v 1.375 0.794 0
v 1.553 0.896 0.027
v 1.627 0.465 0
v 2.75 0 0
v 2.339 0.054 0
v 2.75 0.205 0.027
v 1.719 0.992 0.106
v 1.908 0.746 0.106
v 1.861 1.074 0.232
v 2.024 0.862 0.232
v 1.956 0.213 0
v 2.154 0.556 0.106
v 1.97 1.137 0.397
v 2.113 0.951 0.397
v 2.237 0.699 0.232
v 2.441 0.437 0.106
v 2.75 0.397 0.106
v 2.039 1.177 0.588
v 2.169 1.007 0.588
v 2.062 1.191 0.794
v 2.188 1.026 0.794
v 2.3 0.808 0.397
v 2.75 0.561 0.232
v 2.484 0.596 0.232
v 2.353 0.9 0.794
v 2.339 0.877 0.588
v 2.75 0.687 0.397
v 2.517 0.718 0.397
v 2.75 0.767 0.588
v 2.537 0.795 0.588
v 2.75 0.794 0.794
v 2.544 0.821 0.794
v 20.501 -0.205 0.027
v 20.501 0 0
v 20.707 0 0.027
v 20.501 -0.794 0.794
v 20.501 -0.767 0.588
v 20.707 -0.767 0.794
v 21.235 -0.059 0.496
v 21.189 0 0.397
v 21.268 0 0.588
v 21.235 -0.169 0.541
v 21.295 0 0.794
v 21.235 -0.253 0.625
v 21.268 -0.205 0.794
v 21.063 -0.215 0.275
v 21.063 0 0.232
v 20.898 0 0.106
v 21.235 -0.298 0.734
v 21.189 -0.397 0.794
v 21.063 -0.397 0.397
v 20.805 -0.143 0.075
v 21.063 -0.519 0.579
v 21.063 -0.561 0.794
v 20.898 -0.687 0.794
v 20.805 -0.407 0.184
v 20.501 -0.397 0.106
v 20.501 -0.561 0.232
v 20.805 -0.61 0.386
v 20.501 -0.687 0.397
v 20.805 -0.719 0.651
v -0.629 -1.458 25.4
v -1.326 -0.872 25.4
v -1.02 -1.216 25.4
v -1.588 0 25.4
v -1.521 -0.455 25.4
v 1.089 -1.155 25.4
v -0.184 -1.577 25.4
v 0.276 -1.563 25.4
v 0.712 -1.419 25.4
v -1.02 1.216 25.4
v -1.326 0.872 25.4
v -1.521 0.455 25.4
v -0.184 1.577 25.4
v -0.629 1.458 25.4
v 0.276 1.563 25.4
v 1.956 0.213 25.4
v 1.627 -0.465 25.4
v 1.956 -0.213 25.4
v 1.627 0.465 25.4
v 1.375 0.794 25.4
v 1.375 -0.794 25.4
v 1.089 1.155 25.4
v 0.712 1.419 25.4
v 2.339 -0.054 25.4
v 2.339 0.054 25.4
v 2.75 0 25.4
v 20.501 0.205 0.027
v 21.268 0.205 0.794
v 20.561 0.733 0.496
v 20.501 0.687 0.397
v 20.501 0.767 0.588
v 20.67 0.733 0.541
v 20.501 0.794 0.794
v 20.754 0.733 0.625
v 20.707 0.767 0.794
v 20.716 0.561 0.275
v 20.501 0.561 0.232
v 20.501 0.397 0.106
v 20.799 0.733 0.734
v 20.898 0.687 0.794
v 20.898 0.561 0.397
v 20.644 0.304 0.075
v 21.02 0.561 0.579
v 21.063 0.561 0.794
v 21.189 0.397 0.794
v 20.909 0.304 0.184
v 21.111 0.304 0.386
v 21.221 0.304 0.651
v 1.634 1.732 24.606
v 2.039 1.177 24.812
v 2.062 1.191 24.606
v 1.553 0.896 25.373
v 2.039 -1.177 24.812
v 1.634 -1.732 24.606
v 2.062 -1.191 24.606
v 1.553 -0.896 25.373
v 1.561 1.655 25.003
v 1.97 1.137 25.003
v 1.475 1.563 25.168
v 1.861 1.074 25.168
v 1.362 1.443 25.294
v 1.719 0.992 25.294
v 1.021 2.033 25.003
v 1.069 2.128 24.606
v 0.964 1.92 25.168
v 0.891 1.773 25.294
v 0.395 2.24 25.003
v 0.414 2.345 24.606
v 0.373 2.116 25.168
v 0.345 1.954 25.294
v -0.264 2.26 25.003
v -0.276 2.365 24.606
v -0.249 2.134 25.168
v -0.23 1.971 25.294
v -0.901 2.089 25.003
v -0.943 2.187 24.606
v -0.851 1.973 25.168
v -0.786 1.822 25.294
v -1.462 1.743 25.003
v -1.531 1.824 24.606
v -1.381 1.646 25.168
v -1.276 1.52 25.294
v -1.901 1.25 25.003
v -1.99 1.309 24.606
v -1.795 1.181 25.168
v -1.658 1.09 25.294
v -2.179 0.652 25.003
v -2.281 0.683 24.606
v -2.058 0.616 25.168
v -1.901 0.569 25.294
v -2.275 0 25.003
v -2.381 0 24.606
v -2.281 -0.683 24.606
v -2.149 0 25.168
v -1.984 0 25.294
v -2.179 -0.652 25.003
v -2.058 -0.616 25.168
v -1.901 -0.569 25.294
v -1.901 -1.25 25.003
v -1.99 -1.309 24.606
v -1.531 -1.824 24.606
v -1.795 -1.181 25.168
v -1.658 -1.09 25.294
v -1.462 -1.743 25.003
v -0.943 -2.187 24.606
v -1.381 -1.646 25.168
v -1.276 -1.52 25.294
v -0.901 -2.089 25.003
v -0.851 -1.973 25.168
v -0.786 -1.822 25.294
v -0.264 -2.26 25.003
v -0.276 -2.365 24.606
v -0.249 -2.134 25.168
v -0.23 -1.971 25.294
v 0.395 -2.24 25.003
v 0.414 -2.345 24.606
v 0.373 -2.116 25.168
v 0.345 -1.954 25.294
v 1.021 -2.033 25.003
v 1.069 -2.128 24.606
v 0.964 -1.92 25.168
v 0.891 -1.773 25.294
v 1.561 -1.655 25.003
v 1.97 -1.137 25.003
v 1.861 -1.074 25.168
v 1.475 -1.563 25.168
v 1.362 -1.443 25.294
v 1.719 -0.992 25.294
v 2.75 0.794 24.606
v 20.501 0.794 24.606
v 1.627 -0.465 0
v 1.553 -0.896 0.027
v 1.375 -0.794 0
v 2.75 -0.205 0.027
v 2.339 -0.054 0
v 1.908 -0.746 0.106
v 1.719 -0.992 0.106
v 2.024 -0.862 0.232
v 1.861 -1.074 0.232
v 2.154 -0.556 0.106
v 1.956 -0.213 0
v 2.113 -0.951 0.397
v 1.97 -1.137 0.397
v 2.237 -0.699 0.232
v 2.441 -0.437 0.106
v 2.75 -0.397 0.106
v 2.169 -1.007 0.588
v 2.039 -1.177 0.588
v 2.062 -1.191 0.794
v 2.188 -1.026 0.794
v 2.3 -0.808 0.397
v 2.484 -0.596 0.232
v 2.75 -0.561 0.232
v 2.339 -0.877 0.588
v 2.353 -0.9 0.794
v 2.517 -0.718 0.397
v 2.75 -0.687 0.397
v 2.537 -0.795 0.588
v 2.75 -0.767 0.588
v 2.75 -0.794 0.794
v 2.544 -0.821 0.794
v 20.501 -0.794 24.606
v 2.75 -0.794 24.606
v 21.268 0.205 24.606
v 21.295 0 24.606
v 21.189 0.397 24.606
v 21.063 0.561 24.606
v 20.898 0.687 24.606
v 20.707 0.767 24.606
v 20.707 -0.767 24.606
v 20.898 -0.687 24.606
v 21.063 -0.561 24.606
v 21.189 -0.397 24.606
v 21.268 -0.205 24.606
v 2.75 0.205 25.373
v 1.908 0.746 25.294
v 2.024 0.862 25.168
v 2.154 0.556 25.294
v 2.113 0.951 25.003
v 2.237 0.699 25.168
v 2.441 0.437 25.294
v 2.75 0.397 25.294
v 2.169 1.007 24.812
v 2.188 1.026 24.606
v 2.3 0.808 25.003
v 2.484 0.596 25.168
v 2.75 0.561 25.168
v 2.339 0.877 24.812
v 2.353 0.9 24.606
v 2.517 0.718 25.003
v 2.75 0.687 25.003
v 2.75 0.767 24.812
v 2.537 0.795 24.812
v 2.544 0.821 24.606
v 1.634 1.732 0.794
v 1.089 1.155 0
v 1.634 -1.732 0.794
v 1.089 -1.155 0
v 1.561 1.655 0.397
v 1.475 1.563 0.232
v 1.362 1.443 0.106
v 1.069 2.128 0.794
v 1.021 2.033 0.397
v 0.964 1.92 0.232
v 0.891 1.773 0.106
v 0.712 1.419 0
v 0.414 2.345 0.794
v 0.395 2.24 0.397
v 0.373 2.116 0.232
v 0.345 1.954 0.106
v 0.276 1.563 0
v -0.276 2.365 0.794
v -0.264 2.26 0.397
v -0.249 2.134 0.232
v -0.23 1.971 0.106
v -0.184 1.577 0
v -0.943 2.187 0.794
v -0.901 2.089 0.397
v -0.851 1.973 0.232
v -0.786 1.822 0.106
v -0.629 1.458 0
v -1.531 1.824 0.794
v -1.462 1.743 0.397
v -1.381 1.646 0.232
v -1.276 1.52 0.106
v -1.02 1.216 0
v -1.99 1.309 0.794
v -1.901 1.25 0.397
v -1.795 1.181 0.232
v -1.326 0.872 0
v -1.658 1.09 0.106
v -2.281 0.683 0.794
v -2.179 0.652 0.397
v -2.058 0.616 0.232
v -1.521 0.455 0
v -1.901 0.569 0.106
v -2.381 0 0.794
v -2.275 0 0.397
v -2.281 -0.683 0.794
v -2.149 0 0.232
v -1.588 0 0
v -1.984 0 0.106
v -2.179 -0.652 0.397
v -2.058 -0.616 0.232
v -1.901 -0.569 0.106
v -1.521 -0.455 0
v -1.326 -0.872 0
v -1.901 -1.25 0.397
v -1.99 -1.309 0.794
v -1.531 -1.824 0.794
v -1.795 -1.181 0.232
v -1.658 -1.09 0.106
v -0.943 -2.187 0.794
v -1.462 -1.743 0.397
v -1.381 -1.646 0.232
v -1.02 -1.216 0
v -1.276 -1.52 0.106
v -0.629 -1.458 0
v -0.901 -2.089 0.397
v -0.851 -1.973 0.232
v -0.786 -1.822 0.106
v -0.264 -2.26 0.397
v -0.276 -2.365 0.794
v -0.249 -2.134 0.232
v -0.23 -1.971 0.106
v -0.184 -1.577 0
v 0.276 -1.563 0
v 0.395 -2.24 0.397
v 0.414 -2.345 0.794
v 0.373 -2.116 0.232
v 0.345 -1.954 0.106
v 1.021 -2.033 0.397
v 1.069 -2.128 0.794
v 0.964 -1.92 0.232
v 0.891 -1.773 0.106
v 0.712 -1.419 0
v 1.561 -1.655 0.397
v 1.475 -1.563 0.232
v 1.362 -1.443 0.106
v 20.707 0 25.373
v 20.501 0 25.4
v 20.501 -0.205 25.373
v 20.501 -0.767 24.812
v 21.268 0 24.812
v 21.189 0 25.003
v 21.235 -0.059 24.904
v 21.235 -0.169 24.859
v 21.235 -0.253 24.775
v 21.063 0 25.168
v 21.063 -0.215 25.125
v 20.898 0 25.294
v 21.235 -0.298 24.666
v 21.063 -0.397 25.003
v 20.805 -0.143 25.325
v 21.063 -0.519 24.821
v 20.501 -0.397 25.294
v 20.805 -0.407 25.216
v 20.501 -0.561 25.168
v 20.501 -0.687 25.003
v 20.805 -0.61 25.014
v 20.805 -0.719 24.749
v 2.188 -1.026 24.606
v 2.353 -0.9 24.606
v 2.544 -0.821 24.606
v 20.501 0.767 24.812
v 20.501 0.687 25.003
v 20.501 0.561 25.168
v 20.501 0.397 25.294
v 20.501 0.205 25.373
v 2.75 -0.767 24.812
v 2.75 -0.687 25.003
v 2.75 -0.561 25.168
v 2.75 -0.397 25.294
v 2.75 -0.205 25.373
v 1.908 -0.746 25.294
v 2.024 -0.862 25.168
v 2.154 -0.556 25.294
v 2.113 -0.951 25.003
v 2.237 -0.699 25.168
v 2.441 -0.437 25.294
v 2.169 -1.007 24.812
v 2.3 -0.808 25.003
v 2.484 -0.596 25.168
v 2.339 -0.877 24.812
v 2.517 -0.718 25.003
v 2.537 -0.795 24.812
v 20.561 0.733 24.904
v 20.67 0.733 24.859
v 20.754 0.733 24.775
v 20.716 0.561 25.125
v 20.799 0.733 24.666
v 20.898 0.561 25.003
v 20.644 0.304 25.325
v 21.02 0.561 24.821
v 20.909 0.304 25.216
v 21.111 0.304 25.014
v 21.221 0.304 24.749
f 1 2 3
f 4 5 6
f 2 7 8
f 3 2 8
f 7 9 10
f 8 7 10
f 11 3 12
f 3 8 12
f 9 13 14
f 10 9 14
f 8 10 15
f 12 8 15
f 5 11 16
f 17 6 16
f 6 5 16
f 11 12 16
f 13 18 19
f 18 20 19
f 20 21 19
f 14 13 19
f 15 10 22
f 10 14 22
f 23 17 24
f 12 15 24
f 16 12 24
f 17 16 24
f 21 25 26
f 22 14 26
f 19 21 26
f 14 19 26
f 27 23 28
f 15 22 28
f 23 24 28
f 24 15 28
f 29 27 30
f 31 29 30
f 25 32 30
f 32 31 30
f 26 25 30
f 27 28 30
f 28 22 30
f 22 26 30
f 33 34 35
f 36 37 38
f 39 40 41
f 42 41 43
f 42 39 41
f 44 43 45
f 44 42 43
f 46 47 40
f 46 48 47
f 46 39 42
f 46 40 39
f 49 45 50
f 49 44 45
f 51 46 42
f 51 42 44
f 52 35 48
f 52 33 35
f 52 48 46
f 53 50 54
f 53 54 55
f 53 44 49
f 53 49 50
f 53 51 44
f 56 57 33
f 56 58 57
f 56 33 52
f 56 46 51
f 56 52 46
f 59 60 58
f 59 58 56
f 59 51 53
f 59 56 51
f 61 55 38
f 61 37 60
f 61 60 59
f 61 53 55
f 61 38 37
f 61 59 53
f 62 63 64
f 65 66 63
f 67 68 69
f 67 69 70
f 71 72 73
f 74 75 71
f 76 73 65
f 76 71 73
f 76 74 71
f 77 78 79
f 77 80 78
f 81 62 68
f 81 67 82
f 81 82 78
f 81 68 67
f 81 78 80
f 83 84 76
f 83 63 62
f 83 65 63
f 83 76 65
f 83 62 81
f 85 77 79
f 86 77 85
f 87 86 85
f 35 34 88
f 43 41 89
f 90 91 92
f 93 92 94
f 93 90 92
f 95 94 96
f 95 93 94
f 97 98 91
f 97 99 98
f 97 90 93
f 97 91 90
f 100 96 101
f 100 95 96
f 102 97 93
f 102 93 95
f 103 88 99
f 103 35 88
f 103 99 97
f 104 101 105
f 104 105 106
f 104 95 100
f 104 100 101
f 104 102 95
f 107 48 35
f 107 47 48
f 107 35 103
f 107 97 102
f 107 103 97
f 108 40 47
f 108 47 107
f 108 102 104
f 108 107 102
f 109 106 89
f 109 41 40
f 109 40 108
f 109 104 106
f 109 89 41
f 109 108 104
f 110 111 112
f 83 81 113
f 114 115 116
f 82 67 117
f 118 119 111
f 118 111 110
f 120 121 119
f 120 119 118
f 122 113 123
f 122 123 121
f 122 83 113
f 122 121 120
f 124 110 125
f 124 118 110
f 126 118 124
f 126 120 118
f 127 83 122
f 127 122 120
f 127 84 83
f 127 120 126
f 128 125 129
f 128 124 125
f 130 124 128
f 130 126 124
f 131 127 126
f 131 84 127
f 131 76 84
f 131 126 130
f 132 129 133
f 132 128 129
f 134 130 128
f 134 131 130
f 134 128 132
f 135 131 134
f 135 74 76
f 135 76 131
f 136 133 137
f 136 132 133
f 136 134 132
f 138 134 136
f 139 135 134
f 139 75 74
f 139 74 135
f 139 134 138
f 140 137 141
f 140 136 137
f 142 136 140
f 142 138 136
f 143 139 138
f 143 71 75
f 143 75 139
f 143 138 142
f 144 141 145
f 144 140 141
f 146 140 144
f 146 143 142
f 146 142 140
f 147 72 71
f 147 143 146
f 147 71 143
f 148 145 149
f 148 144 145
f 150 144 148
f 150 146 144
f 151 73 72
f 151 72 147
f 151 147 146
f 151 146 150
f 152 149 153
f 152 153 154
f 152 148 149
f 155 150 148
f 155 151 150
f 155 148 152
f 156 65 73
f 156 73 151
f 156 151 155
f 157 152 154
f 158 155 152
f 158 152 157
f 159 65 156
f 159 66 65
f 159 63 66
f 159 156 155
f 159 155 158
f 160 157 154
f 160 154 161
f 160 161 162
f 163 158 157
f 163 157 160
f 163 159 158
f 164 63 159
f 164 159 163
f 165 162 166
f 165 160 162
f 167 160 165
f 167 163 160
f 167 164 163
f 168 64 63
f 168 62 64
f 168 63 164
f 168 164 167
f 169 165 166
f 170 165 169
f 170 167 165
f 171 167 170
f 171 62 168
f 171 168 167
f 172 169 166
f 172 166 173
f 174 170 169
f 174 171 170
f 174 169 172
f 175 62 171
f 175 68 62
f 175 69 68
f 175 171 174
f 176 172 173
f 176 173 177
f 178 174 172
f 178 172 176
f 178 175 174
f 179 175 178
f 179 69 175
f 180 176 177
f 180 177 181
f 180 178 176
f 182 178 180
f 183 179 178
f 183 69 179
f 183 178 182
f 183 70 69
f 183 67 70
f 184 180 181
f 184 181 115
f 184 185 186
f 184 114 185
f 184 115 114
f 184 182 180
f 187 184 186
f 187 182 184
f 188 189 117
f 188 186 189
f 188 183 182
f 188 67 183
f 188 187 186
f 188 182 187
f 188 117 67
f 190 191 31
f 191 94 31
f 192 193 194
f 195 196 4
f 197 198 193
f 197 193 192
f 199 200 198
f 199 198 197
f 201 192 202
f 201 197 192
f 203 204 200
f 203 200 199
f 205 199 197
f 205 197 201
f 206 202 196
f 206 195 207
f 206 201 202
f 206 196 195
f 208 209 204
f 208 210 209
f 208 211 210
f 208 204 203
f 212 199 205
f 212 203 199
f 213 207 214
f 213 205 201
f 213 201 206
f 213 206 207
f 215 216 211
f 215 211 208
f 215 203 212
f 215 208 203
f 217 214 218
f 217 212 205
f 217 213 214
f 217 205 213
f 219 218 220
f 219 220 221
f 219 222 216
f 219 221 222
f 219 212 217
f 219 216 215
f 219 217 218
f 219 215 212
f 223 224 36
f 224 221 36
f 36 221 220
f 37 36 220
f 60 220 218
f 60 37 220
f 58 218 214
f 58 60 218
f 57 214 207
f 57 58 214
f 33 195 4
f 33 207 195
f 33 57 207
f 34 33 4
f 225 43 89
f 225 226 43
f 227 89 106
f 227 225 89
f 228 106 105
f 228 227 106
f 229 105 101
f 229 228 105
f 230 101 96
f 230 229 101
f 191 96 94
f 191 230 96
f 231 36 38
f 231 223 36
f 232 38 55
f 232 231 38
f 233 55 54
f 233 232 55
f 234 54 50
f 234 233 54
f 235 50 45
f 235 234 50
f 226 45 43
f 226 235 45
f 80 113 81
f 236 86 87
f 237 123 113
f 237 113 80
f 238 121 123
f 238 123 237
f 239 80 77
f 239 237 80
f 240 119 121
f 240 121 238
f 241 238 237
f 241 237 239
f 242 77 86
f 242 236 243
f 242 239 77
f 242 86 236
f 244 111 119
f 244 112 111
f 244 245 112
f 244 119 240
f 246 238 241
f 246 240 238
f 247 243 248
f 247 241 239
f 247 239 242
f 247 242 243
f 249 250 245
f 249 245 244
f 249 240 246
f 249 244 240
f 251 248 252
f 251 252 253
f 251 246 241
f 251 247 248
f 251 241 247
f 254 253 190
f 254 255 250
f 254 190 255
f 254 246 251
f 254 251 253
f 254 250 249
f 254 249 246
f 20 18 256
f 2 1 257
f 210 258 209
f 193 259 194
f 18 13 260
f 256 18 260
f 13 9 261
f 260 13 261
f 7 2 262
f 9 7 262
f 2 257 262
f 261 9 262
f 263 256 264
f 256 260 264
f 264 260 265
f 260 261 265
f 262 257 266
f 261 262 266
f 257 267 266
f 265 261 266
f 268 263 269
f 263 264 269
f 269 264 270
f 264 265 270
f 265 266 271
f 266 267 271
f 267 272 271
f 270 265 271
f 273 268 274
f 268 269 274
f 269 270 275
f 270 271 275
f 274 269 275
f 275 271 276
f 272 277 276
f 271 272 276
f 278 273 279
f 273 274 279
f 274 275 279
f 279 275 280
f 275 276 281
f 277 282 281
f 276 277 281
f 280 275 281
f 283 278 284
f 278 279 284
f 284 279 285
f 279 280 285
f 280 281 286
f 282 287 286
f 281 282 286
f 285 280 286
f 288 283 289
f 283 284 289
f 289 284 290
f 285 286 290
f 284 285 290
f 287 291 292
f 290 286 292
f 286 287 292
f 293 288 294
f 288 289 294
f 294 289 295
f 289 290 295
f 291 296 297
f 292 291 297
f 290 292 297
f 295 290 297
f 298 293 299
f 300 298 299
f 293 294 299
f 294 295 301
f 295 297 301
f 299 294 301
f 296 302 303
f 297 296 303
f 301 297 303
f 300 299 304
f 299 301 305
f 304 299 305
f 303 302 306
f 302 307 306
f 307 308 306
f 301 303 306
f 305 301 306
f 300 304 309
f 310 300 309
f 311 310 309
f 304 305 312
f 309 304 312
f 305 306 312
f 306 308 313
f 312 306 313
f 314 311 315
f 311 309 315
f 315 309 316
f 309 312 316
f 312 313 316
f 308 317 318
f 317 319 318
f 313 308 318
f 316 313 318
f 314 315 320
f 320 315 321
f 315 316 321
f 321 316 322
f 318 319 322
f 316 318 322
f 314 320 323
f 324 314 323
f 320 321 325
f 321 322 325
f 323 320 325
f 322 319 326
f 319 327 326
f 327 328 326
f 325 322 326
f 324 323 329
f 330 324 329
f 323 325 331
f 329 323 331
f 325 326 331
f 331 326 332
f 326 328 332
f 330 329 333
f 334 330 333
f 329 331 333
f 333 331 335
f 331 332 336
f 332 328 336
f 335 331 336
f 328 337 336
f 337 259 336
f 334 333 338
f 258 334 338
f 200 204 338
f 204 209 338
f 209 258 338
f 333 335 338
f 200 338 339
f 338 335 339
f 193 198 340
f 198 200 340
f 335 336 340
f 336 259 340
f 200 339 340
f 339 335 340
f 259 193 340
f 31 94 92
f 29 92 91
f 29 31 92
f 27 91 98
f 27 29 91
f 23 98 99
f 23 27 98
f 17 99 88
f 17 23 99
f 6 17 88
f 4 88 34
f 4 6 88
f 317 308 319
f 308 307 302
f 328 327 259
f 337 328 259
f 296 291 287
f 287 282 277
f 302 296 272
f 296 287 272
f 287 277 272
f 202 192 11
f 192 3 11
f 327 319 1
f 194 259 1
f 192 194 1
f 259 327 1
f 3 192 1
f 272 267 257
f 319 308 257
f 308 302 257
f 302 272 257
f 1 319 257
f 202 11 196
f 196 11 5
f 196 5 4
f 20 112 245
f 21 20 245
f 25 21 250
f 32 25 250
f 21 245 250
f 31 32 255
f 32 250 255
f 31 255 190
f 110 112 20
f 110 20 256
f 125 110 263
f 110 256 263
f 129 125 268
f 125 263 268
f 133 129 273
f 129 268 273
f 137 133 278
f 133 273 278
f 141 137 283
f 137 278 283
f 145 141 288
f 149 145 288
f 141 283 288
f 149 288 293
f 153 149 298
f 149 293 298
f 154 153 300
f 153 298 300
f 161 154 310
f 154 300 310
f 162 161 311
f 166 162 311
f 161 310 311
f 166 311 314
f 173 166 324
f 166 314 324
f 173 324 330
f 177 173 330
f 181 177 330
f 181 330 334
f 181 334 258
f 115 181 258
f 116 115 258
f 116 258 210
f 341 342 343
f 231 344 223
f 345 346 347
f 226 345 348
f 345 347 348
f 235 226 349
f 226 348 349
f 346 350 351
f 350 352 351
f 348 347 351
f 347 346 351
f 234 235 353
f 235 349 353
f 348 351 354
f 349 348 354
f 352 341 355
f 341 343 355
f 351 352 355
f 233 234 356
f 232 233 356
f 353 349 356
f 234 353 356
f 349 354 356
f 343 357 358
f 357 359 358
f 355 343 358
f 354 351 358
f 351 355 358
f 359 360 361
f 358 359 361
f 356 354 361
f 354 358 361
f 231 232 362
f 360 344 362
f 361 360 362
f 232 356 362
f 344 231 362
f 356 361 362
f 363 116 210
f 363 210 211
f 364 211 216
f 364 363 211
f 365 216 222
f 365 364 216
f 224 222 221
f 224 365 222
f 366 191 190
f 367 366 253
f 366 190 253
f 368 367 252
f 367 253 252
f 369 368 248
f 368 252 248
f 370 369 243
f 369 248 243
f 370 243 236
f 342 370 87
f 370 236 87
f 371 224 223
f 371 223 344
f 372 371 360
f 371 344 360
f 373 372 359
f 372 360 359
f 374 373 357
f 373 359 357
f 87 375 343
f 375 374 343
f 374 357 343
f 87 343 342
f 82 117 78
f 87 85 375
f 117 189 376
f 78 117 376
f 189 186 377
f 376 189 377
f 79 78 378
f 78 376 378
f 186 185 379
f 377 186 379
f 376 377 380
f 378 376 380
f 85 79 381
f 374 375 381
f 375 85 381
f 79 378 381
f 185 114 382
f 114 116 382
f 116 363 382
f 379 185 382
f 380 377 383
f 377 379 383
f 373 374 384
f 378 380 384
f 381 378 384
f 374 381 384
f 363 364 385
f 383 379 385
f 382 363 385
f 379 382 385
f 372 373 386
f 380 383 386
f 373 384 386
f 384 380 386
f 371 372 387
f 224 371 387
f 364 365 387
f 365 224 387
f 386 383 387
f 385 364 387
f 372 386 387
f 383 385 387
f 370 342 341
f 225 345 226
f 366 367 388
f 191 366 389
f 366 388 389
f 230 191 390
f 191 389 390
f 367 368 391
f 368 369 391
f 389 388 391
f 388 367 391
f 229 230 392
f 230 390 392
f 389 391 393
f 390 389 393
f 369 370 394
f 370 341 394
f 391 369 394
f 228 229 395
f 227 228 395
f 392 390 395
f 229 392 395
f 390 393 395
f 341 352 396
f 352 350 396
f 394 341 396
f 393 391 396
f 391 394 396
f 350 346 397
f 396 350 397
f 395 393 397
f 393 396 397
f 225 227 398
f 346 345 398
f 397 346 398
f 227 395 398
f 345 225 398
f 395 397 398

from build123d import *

# Parameters (mm, degrees)
F1_DEPTH = 25.4
F2_R     = 0.79374


# Not quite as in the source:
# - a fillet or chamfer is up to 0.001 mm smaller than in the source, because OpenCascade refuses the exact size
# - a feature names something its author has since deleted; it is built from what else it names


with BuildPart() as f1:
    # F0 (on Top) → F1 (new body)
    with BuildSketch(Plane.XY):
        with BuildLine():
            ThreePointArc((2.2450640303, -0.79375), (2.3469565702, -0.4026740868), (2.38125, 0))
            ThreePointArc((2.38125, 0), (2.3469565702, 0.4026740868), (2.2450640303, 0.79375))
            ThreePointArc((2.2450640303, 0.79375), (-2.38125, 0), (2.2450640303, -0.79375))
        make_face()
        with BuildLine():
            ThreePointArc((2.2450640303, 0.79375), (2.3469565702, 0.4026740868), (2.38125, 0))
            ThreePointArc((2.38125, 0), (2.3469565702, -0.4026740868), (2.2450640303, -0.79375))
            Line((2.2450640303, -0.79375), (21.2950640303, -0.79375))
            Line((21.2950640303, -0.79375), (21.2950640303, 0))
            Line((21.2950640303, 0), (21.2950640303, 0.79375))
            Line((21.2950640303, 0.79375), (2.2450640303, 0.79375))
        make_face()
    extrude(amount=F1_DEPTH)

    # F2 (radius 0.79375 in the source; OpenCascade refuses exactly that, so slightly less here)
    f2_edges = [f1.edges().sort_by_distance(p)[0] for p in [
        (-2.38125, 0, 25.4),
        (11.770064, -0.79375, 25.4),
        (21.295064, 0, 25.4),
        (11.770064, 0.79375, 25.4),
        (-2.38125, 0, 0),
        (11.770064, -0.79375, 0),
        (21.295064, 0, 0),
        (11.770064, 0.79375, 0),
        (21.295064, 0.79375, 12.7),
        (2.245064, 0.79375, 12.7),
        (2.245064, -0.79375, 12.7),
        (21.295064, -0.79375, 12.7),
    ]]
    fillet(f2_edges, radius=F2_R)


solid = f1.part
